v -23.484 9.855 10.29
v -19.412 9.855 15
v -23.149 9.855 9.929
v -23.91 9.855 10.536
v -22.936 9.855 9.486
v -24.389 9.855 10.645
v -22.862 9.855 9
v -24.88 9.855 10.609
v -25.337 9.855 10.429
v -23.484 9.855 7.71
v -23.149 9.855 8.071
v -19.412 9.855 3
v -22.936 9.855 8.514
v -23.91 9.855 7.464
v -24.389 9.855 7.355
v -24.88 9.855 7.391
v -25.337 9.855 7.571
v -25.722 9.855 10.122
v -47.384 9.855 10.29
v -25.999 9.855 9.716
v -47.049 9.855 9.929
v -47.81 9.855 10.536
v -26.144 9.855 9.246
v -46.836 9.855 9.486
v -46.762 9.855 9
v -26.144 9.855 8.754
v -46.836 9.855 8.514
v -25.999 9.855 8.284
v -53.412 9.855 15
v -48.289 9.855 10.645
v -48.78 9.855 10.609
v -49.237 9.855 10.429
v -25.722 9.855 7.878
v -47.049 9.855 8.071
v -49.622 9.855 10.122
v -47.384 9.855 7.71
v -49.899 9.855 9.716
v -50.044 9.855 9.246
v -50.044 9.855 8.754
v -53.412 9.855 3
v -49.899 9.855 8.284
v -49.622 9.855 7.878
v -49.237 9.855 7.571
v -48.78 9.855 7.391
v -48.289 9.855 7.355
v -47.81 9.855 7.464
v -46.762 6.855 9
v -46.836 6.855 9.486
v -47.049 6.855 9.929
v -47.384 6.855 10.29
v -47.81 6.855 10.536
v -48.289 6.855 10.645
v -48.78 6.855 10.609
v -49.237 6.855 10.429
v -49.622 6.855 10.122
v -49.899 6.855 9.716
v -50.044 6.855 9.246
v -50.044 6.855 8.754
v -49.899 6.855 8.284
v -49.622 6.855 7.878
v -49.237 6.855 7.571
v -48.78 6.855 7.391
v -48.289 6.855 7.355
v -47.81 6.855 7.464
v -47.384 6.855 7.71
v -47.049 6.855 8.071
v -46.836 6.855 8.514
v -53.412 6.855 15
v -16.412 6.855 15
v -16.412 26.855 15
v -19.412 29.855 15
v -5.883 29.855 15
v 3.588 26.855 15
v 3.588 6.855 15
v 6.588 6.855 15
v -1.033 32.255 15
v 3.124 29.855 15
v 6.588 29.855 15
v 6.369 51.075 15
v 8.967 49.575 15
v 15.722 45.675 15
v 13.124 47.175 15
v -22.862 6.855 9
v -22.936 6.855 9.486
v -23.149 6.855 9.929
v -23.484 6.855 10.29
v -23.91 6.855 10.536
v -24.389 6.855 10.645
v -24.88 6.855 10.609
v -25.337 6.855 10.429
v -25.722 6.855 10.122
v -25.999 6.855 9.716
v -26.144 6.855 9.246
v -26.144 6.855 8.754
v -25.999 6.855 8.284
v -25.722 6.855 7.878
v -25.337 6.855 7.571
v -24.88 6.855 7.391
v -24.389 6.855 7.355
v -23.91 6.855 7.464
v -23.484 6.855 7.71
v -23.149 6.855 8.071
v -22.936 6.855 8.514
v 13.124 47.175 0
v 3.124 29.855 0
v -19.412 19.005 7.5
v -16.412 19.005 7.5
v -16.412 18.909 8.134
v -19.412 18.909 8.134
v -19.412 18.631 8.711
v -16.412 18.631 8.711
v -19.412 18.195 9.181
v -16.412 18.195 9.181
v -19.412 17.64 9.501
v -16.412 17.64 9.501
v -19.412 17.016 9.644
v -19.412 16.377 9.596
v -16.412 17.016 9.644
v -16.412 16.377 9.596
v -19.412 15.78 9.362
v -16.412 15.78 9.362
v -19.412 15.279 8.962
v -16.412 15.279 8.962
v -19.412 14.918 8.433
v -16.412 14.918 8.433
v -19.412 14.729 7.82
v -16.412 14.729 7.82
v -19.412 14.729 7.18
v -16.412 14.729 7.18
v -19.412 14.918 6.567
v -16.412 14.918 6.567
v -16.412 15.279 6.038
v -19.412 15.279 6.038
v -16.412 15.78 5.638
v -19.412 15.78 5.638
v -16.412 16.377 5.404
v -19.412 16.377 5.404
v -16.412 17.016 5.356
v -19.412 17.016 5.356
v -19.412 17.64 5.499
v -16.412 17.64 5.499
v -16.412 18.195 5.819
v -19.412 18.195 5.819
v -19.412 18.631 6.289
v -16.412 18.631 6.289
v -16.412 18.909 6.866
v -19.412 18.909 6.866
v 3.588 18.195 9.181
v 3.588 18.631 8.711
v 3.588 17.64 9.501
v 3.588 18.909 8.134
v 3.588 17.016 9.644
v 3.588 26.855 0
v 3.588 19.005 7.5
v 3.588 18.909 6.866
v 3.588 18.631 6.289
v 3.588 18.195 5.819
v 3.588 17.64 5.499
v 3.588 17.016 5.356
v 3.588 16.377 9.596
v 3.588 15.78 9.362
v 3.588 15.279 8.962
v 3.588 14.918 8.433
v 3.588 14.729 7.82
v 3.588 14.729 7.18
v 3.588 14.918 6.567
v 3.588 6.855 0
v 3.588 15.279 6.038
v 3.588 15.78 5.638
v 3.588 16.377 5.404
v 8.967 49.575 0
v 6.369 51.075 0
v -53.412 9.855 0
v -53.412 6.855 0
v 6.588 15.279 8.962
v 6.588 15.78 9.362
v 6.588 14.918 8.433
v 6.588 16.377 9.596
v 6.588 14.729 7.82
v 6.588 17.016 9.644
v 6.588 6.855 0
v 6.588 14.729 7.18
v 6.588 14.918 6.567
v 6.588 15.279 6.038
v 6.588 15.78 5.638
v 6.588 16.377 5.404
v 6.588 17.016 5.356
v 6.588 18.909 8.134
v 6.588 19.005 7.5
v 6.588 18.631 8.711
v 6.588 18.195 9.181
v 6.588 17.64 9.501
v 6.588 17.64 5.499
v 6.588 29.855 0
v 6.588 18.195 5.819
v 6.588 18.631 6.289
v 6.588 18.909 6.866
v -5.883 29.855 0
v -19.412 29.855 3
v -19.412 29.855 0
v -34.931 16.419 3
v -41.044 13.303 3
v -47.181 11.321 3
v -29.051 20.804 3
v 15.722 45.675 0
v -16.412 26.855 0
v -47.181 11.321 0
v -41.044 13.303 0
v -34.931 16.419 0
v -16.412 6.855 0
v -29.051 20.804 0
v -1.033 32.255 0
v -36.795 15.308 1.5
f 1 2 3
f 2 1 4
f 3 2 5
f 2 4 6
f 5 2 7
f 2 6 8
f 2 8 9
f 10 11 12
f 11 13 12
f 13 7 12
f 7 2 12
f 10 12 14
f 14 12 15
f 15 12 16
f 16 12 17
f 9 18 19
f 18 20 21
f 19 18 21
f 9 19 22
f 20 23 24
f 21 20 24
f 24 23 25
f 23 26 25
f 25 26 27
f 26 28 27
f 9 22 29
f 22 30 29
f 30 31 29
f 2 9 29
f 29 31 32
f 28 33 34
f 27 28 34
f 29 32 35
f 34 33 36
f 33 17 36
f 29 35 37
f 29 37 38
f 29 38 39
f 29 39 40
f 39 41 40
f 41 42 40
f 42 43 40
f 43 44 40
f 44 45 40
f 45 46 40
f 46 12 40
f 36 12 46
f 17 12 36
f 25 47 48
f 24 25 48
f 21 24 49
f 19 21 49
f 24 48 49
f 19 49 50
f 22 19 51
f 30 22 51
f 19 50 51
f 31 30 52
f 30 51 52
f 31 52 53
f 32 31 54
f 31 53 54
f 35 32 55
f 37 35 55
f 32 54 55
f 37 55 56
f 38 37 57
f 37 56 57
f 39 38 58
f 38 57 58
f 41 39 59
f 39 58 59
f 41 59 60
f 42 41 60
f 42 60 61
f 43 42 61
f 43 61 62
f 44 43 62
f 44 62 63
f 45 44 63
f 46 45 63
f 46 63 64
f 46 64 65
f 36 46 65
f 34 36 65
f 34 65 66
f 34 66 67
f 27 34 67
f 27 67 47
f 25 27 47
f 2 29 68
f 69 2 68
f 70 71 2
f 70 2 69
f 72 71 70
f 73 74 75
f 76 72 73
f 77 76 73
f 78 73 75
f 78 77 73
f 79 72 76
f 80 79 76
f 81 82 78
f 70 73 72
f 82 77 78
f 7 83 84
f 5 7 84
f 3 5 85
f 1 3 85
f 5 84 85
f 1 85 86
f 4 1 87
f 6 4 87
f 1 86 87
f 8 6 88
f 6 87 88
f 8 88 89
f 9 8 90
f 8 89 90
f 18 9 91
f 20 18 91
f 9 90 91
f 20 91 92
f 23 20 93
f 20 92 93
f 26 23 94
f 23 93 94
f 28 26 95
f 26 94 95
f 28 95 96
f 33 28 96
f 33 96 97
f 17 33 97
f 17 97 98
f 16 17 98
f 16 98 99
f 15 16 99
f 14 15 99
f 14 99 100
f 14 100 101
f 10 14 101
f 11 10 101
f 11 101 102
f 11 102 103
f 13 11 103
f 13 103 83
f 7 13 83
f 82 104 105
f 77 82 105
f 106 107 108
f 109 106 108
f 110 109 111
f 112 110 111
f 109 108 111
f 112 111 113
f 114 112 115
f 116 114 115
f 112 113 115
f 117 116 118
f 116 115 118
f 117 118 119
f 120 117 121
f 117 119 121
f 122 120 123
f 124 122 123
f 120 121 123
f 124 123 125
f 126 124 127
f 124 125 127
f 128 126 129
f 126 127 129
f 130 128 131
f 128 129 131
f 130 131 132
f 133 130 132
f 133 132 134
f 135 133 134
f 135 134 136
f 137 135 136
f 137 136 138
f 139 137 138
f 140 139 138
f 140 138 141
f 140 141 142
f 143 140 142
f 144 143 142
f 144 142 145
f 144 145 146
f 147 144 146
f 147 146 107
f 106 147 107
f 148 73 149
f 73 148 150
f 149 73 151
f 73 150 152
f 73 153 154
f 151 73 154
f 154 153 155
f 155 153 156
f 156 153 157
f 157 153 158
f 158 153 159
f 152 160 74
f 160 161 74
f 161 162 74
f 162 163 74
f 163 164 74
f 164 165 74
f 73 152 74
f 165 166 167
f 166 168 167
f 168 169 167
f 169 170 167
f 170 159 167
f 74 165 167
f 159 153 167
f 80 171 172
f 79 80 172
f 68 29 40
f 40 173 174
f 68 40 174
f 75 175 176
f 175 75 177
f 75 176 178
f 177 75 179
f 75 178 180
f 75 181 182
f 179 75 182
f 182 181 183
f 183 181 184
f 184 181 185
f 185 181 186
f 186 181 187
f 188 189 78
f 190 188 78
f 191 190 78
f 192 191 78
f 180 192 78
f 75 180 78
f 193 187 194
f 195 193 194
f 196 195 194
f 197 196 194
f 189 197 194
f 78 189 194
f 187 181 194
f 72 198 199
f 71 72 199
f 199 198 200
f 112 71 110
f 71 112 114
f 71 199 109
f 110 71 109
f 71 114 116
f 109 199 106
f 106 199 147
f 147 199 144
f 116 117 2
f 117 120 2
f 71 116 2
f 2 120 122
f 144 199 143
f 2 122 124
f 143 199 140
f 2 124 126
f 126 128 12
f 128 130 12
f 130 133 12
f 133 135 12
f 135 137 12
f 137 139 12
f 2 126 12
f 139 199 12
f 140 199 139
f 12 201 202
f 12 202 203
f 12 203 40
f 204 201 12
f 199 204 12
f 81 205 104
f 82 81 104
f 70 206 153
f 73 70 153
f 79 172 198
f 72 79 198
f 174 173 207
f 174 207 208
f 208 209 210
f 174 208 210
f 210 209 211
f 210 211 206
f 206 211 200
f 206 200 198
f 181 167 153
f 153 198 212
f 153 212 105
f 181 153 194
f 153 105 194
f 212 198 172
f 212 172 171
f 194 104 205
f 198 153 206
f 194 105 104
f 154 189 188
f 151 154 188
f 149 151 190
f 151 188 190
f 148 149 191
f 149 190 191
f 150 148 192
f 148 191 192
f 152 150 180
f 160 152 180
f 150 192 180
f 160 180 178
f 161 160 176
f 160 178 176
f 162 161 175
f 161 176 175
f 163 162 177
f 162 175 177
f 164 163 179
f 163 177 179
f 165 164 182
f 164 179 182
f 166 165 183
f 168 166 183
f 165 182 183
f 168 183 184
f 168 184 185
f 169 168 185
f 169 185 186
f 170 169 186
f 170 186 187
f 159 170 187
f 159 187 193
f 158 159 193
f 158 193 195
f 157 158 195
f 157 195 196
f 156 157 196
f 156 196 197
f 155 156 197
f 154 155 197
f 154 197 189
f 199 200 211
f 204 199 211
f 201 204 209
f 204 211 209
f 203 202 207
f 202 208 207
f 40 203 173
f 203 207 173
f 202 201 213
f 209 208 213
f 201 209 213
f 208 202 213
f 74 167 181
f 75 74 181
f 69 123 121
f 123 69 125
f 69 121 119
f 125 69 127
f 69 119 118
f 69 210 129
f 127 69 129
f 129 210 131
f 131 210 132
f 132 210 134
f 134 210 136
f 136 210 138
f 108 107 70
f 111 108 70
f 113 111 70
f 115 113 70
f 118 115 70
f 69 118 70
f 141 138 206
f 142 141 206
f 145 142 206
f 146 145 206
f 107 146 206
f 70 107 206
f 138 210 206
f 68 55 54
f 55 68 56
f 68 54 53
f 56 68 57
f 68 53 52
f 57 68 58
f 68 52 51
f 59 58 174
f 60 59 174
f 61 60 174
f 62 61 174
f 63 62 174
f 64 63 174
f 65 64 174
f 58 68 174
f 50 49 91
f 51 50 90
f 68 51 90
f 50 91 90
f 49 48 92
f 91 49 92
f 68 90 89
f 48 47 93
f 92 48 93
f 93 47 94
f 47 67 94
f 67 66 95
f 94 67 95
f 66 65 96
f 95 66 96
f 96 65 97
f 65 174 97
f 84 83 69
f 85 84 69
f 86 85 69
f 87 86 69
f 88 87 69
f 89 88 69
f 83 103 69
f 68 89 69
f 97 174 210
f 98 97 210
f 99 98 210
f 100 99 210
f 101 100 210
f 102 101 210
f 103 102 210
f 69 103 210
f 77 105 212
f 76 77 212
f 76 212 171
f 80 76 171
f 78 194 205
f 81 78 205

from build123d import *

# Parameters (mm, degrees)
F1_DEPTH = 15
F2_DEPTH = 3
F3_R     = 1.65
F4_DEPTH = 5
F5_R     = 2.15
F6_DEPTH = 30


with BuildPart() as f1:
    # F0 (on Top) → F1 (new body)
    with BuildSketch(Plane.XY):
        Polygon((-53.4123483514, 9.8549427117), (-53.4123483514, 6.8549427117), (-16.4123483514, 6.8549427117), (-16.4123483514, 26.8549427117), (3.5876516486, 26.8549427117), (3.5876516486, 6.8549427117), (6.5876516486, 6.8549427117), (6.5876516486, 29.8549427117), (15.7216262448, 45.6754507873), (13.1235500334, 47.1754507873), (3.1235500334, 29.8549427117), (-1.0333719047, 32.2549427117), (8.9666280953, 49.5754507873), (6.3685518839, 51.0754507873), (-5.8831141659, 29.8549427117), (-19.4123483514, 29.8549427117), (-19.4123483514, 9.8549427117), align=None)
    extrude(amount=F1_DEPTH)

    # F0 (on Top) → F2 (join)
    with BuildSketch(Plane.XY):
        with BuildLine():
            add(Edge.make_bspline(
                [(-19.4123483514, 29.8549427117), (-25.070528026, 24.2659085839), (-35.6987359263, 13.7675822513), (-47.7683028951, 11.1016175788), (-53.4123483514, 9.8549427117)],
                knots=[0, 0, 0, 0, 0.5323738233, 1, 1, 1, 1], degree=3))
            Line((-53.4123483514, 9.8549427117), (-19.4123483514, 9.8549427117))
            Line((-19.4123483514, 9.8549427117), (-19.4123483514, 29.8549427117))
        make_face()
    extrude(amount=F2_DEPTH)

    # F3 (on face) → F4 (cut)
    with BuildSketch(Plane.XZ.offset(-6.8549427117)):
        with Locations((-48.4123483514, 9)):
            Circle(F3_R)
        with Locations((-24.5123483514, 9)):
            Circle(F3_R)
    extrude(amount=-F4_DEPTH, mode=Mode.SUBTRACT)

    # F5 (on face) → F6 (cut)
    with BuildSketch(Plane.YZ.offset(6.5876516486)):
        with Locations((16.8549427117, 7.5)):
            Circle(F5_R)
    extrude(amount=-F6_DEPTH, mode=Mode.SUBTRACT)


solid = f1.part
